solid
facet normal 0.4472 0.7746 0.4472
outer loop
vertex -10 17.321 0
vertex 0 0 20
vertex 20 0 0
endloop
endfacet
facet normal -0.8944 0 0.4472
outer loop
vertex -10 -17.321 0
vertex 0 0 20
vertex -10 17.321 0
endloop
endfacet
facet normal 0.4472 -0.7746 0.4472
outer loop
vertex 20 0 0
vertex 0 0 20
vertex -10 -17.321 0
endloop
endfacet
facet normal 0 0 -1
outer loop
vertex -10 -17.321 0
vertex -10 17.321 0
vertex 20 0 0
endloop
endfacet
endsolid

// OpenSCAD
//Parametric Cylinder / Cone

//(mm)
height = 20; //[10,20,30,40,50]

//(mm)
bottom_radius = 20; //[20,30,40,50]

//(mm)
top_radius = 0; //[0:0-Apex,1,2,4,6,8,10,20,30,40,50]

number_of_faces = 3; //[3:3-Triangular,4:4-Square,5:5-Pentagonal,6:6-Hexagonal,7:7-Heptagonal,8:8-Octogonal,9:9-Enneagonal,10:10-Decagonal,33:33-Round (Course),66:66-Round (Medium),99:99-Round (Fine)]

cylinder(height,bottom_radius,top_radius,$fn=number_of_faces);
